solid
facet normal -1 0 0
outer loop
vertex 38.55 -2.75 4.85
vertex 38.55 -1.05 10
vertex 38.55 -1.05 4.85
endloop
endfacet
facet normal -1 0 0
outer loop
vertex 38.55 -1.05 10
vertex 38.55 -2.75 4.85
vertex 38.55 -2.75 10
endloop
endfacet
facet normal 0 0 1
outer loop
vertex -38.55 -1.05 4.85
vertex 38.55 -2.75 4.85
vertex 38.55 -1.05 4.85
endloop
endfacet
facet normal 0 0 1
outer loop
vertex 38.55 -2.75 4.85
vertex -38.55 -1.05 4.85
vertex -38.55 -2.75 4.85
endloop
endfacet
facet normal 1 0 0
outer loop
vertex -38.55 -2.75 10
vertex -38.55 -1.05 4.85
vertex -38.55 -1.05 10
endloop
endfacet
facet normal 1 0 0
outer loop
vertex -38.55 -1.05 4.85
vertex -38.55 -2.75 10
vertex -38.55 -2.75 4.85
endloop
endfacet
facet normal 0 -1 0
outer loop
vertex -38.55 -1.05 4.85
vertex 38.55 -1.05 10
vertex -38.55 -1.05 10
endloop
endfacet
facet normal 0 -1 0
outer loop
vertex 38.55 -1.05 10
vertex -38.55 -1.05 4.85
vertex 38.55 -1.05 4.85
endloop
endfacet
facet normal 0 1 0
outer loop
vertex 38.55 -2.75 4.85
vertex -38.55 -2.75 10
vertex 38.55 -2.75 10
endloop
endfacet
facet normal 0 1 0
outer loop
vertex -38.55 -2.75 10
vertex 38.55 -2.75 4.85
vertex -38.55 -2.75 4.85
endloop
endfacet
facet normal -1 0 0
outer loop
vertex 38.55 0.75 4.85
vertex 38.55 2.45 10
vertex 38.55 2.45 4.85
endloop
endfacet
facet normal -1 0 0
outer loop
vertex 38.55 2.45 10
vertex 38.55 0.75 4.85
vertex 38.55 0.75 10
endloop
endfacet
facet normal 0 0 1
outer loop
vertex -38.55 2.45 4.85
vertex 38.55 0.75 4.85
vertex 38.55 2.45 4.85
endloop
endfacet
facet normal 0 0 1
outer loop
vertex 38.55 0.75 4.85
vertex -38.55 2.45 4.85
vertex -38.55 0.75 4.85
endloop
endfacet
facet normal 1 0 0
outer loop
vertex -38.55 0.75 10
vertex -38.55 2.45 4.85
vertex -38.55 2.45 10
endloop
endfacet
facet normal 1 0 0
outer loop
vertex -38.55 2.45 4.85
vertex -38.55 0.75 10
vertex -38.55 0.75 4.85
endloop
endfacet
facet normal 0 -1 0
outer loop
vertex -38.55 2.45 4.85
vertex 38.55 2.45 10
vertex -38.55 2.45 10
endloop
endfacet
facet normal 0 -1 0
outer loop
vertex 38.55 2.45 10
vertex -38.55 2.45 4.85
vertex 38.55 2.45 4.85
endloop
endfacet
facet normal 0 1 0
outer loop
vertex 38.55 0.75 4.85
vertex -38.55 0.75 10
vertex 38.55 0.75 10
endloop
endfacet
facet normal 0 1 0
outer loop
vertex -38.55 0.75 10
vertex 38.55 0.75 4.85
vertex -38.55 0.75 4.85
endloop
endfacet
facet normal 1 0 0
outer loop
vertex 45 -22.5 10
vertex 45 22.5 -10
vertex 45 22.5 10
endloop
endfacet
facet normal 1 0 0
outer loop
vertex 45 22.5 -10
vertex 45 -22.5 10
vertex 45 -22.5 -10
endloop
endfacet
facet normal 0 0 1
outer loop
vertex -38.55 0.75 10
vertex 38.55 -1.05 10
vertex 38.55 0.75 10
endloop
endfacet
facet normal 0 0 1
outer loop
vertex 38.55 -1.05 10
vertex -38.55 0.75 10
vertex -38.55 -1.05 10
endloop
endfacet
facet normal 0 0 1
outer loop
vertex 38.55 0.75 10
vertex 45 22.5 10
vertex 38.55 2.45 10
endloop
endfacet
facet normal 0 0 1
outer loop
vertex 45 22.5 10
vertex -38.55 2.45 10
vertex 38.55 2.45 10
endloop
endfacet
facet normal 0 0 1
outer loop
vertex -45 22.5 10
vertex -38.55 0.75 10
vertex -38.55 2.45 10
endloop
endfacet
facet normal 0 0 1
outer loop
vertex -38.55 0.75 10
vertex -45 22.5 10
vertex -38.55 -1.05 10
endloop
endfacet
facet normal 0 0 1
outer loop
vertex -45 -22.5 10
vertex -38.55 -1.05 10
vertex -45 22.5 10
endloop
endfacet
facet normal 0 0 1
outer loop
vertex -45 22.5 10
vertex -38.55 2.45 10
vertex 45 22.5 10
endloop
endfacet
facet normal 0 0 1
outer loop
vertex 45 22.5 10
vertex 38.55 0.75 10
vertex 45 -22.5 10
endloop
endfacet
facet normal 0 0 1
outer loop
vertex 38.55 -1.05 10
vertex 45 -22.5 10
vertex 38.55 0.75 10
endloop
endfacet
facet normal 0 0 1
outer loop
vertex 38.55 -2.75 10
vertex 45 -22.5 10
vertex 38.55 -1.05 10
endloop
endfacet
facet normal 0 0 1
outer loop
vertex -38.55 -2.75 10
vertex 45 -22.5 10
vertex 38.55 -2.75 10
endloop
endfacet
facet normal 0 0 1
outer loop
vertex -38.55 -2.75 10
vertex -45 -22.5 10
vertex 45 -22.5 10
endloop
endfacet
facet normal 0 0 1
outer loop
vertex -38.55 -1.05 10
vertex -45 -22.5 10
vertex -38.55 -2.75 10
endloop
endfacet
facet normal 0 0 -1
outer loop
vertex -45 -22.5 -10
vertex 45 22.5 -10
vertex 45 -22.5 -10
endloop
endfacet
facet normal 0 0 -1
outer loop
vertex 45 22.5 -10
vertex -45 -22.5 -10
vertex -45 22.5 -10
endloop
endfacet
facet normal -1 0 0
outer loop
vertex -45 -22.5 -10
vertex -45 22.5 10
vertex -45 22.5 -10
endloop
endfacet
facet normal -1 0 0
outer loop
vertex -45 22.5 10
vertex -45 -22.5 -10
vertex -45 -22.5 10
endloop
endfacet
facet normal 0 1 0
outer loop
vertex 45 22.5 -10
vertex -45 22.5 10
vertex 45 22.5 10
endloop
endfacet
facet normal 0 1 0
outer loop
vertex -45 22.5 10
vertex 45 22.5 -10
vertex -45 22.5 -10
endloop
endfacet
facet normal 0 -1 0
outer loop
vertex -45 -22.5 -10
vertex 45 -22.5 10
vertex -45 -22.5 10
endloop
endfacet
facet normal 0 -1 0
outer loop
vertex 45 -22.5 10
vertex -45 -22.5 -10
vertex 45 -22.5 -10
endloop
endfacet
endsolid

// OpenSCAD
// Dimensions in millimetres
block_length = 90;      // X dimension
block_width = 45;       // Y dimension
block_height = 20;      // Z dimension

slide_length = 75;      // Length of the slide
slide_width = 25;       // Width of the slide
slide_thickness = 1;    // Thickness of the slide

slot_length = 77;       // Length of the slot (slightly shorter than block to allow for walls)
slot_width = 1.6;       // Width of the slot
slot_depth = 10;        // Depth of the slot (how deep the cut is)
slot_spacing = 3.5;     // Centre-to-centre distance between slots

// Derived dimensions
// Calculate the number of slots that fit within the block width
// We use a for loop to determine the exact count based on spacing
num_slots = 0;
for (i = [0 : 1]) {
    if ((i * slot_spacing) + (slot_width / 2) < (block_width / 2)) {
        num_slots = i + 1;
    }
}

// Calculate the total width occupied by the slots
total_slot_width = (num_slots * slot_width) + ((num_slots - 1) * slot_spacing);

// Calculate the offset to center the group of slots
slot_offset = (block_width - total_slot_width) / 2;

$fn = 64;

module base_block() {
    cube([block_length, block_width, block_height], center=true);
}

module slot_cutout() {
    // The slot is a rectangular prism cut into the top face
    // We extend it slightly past the block faces to ensure clean cuts
    translate([0, slot_width/2, block_height - slot_depth - 0.1])
    cube([slot_length + 0.1, slot_width + 0.1, slot_depth + 0.1], center=true);
}

module drying_rack() {
    difference() {
        base_block();
        
        // Create the slots
        for (i = [0 : num_slots - 1]) {
            // Calculate Y position for each slot
            y_pos = (i * slot_spacing) + (slot_width / 2);
            
            translate([0, y_pos, 0])
            slot_cutout();
        }
    }
}

// Render the part
drying_rack();
